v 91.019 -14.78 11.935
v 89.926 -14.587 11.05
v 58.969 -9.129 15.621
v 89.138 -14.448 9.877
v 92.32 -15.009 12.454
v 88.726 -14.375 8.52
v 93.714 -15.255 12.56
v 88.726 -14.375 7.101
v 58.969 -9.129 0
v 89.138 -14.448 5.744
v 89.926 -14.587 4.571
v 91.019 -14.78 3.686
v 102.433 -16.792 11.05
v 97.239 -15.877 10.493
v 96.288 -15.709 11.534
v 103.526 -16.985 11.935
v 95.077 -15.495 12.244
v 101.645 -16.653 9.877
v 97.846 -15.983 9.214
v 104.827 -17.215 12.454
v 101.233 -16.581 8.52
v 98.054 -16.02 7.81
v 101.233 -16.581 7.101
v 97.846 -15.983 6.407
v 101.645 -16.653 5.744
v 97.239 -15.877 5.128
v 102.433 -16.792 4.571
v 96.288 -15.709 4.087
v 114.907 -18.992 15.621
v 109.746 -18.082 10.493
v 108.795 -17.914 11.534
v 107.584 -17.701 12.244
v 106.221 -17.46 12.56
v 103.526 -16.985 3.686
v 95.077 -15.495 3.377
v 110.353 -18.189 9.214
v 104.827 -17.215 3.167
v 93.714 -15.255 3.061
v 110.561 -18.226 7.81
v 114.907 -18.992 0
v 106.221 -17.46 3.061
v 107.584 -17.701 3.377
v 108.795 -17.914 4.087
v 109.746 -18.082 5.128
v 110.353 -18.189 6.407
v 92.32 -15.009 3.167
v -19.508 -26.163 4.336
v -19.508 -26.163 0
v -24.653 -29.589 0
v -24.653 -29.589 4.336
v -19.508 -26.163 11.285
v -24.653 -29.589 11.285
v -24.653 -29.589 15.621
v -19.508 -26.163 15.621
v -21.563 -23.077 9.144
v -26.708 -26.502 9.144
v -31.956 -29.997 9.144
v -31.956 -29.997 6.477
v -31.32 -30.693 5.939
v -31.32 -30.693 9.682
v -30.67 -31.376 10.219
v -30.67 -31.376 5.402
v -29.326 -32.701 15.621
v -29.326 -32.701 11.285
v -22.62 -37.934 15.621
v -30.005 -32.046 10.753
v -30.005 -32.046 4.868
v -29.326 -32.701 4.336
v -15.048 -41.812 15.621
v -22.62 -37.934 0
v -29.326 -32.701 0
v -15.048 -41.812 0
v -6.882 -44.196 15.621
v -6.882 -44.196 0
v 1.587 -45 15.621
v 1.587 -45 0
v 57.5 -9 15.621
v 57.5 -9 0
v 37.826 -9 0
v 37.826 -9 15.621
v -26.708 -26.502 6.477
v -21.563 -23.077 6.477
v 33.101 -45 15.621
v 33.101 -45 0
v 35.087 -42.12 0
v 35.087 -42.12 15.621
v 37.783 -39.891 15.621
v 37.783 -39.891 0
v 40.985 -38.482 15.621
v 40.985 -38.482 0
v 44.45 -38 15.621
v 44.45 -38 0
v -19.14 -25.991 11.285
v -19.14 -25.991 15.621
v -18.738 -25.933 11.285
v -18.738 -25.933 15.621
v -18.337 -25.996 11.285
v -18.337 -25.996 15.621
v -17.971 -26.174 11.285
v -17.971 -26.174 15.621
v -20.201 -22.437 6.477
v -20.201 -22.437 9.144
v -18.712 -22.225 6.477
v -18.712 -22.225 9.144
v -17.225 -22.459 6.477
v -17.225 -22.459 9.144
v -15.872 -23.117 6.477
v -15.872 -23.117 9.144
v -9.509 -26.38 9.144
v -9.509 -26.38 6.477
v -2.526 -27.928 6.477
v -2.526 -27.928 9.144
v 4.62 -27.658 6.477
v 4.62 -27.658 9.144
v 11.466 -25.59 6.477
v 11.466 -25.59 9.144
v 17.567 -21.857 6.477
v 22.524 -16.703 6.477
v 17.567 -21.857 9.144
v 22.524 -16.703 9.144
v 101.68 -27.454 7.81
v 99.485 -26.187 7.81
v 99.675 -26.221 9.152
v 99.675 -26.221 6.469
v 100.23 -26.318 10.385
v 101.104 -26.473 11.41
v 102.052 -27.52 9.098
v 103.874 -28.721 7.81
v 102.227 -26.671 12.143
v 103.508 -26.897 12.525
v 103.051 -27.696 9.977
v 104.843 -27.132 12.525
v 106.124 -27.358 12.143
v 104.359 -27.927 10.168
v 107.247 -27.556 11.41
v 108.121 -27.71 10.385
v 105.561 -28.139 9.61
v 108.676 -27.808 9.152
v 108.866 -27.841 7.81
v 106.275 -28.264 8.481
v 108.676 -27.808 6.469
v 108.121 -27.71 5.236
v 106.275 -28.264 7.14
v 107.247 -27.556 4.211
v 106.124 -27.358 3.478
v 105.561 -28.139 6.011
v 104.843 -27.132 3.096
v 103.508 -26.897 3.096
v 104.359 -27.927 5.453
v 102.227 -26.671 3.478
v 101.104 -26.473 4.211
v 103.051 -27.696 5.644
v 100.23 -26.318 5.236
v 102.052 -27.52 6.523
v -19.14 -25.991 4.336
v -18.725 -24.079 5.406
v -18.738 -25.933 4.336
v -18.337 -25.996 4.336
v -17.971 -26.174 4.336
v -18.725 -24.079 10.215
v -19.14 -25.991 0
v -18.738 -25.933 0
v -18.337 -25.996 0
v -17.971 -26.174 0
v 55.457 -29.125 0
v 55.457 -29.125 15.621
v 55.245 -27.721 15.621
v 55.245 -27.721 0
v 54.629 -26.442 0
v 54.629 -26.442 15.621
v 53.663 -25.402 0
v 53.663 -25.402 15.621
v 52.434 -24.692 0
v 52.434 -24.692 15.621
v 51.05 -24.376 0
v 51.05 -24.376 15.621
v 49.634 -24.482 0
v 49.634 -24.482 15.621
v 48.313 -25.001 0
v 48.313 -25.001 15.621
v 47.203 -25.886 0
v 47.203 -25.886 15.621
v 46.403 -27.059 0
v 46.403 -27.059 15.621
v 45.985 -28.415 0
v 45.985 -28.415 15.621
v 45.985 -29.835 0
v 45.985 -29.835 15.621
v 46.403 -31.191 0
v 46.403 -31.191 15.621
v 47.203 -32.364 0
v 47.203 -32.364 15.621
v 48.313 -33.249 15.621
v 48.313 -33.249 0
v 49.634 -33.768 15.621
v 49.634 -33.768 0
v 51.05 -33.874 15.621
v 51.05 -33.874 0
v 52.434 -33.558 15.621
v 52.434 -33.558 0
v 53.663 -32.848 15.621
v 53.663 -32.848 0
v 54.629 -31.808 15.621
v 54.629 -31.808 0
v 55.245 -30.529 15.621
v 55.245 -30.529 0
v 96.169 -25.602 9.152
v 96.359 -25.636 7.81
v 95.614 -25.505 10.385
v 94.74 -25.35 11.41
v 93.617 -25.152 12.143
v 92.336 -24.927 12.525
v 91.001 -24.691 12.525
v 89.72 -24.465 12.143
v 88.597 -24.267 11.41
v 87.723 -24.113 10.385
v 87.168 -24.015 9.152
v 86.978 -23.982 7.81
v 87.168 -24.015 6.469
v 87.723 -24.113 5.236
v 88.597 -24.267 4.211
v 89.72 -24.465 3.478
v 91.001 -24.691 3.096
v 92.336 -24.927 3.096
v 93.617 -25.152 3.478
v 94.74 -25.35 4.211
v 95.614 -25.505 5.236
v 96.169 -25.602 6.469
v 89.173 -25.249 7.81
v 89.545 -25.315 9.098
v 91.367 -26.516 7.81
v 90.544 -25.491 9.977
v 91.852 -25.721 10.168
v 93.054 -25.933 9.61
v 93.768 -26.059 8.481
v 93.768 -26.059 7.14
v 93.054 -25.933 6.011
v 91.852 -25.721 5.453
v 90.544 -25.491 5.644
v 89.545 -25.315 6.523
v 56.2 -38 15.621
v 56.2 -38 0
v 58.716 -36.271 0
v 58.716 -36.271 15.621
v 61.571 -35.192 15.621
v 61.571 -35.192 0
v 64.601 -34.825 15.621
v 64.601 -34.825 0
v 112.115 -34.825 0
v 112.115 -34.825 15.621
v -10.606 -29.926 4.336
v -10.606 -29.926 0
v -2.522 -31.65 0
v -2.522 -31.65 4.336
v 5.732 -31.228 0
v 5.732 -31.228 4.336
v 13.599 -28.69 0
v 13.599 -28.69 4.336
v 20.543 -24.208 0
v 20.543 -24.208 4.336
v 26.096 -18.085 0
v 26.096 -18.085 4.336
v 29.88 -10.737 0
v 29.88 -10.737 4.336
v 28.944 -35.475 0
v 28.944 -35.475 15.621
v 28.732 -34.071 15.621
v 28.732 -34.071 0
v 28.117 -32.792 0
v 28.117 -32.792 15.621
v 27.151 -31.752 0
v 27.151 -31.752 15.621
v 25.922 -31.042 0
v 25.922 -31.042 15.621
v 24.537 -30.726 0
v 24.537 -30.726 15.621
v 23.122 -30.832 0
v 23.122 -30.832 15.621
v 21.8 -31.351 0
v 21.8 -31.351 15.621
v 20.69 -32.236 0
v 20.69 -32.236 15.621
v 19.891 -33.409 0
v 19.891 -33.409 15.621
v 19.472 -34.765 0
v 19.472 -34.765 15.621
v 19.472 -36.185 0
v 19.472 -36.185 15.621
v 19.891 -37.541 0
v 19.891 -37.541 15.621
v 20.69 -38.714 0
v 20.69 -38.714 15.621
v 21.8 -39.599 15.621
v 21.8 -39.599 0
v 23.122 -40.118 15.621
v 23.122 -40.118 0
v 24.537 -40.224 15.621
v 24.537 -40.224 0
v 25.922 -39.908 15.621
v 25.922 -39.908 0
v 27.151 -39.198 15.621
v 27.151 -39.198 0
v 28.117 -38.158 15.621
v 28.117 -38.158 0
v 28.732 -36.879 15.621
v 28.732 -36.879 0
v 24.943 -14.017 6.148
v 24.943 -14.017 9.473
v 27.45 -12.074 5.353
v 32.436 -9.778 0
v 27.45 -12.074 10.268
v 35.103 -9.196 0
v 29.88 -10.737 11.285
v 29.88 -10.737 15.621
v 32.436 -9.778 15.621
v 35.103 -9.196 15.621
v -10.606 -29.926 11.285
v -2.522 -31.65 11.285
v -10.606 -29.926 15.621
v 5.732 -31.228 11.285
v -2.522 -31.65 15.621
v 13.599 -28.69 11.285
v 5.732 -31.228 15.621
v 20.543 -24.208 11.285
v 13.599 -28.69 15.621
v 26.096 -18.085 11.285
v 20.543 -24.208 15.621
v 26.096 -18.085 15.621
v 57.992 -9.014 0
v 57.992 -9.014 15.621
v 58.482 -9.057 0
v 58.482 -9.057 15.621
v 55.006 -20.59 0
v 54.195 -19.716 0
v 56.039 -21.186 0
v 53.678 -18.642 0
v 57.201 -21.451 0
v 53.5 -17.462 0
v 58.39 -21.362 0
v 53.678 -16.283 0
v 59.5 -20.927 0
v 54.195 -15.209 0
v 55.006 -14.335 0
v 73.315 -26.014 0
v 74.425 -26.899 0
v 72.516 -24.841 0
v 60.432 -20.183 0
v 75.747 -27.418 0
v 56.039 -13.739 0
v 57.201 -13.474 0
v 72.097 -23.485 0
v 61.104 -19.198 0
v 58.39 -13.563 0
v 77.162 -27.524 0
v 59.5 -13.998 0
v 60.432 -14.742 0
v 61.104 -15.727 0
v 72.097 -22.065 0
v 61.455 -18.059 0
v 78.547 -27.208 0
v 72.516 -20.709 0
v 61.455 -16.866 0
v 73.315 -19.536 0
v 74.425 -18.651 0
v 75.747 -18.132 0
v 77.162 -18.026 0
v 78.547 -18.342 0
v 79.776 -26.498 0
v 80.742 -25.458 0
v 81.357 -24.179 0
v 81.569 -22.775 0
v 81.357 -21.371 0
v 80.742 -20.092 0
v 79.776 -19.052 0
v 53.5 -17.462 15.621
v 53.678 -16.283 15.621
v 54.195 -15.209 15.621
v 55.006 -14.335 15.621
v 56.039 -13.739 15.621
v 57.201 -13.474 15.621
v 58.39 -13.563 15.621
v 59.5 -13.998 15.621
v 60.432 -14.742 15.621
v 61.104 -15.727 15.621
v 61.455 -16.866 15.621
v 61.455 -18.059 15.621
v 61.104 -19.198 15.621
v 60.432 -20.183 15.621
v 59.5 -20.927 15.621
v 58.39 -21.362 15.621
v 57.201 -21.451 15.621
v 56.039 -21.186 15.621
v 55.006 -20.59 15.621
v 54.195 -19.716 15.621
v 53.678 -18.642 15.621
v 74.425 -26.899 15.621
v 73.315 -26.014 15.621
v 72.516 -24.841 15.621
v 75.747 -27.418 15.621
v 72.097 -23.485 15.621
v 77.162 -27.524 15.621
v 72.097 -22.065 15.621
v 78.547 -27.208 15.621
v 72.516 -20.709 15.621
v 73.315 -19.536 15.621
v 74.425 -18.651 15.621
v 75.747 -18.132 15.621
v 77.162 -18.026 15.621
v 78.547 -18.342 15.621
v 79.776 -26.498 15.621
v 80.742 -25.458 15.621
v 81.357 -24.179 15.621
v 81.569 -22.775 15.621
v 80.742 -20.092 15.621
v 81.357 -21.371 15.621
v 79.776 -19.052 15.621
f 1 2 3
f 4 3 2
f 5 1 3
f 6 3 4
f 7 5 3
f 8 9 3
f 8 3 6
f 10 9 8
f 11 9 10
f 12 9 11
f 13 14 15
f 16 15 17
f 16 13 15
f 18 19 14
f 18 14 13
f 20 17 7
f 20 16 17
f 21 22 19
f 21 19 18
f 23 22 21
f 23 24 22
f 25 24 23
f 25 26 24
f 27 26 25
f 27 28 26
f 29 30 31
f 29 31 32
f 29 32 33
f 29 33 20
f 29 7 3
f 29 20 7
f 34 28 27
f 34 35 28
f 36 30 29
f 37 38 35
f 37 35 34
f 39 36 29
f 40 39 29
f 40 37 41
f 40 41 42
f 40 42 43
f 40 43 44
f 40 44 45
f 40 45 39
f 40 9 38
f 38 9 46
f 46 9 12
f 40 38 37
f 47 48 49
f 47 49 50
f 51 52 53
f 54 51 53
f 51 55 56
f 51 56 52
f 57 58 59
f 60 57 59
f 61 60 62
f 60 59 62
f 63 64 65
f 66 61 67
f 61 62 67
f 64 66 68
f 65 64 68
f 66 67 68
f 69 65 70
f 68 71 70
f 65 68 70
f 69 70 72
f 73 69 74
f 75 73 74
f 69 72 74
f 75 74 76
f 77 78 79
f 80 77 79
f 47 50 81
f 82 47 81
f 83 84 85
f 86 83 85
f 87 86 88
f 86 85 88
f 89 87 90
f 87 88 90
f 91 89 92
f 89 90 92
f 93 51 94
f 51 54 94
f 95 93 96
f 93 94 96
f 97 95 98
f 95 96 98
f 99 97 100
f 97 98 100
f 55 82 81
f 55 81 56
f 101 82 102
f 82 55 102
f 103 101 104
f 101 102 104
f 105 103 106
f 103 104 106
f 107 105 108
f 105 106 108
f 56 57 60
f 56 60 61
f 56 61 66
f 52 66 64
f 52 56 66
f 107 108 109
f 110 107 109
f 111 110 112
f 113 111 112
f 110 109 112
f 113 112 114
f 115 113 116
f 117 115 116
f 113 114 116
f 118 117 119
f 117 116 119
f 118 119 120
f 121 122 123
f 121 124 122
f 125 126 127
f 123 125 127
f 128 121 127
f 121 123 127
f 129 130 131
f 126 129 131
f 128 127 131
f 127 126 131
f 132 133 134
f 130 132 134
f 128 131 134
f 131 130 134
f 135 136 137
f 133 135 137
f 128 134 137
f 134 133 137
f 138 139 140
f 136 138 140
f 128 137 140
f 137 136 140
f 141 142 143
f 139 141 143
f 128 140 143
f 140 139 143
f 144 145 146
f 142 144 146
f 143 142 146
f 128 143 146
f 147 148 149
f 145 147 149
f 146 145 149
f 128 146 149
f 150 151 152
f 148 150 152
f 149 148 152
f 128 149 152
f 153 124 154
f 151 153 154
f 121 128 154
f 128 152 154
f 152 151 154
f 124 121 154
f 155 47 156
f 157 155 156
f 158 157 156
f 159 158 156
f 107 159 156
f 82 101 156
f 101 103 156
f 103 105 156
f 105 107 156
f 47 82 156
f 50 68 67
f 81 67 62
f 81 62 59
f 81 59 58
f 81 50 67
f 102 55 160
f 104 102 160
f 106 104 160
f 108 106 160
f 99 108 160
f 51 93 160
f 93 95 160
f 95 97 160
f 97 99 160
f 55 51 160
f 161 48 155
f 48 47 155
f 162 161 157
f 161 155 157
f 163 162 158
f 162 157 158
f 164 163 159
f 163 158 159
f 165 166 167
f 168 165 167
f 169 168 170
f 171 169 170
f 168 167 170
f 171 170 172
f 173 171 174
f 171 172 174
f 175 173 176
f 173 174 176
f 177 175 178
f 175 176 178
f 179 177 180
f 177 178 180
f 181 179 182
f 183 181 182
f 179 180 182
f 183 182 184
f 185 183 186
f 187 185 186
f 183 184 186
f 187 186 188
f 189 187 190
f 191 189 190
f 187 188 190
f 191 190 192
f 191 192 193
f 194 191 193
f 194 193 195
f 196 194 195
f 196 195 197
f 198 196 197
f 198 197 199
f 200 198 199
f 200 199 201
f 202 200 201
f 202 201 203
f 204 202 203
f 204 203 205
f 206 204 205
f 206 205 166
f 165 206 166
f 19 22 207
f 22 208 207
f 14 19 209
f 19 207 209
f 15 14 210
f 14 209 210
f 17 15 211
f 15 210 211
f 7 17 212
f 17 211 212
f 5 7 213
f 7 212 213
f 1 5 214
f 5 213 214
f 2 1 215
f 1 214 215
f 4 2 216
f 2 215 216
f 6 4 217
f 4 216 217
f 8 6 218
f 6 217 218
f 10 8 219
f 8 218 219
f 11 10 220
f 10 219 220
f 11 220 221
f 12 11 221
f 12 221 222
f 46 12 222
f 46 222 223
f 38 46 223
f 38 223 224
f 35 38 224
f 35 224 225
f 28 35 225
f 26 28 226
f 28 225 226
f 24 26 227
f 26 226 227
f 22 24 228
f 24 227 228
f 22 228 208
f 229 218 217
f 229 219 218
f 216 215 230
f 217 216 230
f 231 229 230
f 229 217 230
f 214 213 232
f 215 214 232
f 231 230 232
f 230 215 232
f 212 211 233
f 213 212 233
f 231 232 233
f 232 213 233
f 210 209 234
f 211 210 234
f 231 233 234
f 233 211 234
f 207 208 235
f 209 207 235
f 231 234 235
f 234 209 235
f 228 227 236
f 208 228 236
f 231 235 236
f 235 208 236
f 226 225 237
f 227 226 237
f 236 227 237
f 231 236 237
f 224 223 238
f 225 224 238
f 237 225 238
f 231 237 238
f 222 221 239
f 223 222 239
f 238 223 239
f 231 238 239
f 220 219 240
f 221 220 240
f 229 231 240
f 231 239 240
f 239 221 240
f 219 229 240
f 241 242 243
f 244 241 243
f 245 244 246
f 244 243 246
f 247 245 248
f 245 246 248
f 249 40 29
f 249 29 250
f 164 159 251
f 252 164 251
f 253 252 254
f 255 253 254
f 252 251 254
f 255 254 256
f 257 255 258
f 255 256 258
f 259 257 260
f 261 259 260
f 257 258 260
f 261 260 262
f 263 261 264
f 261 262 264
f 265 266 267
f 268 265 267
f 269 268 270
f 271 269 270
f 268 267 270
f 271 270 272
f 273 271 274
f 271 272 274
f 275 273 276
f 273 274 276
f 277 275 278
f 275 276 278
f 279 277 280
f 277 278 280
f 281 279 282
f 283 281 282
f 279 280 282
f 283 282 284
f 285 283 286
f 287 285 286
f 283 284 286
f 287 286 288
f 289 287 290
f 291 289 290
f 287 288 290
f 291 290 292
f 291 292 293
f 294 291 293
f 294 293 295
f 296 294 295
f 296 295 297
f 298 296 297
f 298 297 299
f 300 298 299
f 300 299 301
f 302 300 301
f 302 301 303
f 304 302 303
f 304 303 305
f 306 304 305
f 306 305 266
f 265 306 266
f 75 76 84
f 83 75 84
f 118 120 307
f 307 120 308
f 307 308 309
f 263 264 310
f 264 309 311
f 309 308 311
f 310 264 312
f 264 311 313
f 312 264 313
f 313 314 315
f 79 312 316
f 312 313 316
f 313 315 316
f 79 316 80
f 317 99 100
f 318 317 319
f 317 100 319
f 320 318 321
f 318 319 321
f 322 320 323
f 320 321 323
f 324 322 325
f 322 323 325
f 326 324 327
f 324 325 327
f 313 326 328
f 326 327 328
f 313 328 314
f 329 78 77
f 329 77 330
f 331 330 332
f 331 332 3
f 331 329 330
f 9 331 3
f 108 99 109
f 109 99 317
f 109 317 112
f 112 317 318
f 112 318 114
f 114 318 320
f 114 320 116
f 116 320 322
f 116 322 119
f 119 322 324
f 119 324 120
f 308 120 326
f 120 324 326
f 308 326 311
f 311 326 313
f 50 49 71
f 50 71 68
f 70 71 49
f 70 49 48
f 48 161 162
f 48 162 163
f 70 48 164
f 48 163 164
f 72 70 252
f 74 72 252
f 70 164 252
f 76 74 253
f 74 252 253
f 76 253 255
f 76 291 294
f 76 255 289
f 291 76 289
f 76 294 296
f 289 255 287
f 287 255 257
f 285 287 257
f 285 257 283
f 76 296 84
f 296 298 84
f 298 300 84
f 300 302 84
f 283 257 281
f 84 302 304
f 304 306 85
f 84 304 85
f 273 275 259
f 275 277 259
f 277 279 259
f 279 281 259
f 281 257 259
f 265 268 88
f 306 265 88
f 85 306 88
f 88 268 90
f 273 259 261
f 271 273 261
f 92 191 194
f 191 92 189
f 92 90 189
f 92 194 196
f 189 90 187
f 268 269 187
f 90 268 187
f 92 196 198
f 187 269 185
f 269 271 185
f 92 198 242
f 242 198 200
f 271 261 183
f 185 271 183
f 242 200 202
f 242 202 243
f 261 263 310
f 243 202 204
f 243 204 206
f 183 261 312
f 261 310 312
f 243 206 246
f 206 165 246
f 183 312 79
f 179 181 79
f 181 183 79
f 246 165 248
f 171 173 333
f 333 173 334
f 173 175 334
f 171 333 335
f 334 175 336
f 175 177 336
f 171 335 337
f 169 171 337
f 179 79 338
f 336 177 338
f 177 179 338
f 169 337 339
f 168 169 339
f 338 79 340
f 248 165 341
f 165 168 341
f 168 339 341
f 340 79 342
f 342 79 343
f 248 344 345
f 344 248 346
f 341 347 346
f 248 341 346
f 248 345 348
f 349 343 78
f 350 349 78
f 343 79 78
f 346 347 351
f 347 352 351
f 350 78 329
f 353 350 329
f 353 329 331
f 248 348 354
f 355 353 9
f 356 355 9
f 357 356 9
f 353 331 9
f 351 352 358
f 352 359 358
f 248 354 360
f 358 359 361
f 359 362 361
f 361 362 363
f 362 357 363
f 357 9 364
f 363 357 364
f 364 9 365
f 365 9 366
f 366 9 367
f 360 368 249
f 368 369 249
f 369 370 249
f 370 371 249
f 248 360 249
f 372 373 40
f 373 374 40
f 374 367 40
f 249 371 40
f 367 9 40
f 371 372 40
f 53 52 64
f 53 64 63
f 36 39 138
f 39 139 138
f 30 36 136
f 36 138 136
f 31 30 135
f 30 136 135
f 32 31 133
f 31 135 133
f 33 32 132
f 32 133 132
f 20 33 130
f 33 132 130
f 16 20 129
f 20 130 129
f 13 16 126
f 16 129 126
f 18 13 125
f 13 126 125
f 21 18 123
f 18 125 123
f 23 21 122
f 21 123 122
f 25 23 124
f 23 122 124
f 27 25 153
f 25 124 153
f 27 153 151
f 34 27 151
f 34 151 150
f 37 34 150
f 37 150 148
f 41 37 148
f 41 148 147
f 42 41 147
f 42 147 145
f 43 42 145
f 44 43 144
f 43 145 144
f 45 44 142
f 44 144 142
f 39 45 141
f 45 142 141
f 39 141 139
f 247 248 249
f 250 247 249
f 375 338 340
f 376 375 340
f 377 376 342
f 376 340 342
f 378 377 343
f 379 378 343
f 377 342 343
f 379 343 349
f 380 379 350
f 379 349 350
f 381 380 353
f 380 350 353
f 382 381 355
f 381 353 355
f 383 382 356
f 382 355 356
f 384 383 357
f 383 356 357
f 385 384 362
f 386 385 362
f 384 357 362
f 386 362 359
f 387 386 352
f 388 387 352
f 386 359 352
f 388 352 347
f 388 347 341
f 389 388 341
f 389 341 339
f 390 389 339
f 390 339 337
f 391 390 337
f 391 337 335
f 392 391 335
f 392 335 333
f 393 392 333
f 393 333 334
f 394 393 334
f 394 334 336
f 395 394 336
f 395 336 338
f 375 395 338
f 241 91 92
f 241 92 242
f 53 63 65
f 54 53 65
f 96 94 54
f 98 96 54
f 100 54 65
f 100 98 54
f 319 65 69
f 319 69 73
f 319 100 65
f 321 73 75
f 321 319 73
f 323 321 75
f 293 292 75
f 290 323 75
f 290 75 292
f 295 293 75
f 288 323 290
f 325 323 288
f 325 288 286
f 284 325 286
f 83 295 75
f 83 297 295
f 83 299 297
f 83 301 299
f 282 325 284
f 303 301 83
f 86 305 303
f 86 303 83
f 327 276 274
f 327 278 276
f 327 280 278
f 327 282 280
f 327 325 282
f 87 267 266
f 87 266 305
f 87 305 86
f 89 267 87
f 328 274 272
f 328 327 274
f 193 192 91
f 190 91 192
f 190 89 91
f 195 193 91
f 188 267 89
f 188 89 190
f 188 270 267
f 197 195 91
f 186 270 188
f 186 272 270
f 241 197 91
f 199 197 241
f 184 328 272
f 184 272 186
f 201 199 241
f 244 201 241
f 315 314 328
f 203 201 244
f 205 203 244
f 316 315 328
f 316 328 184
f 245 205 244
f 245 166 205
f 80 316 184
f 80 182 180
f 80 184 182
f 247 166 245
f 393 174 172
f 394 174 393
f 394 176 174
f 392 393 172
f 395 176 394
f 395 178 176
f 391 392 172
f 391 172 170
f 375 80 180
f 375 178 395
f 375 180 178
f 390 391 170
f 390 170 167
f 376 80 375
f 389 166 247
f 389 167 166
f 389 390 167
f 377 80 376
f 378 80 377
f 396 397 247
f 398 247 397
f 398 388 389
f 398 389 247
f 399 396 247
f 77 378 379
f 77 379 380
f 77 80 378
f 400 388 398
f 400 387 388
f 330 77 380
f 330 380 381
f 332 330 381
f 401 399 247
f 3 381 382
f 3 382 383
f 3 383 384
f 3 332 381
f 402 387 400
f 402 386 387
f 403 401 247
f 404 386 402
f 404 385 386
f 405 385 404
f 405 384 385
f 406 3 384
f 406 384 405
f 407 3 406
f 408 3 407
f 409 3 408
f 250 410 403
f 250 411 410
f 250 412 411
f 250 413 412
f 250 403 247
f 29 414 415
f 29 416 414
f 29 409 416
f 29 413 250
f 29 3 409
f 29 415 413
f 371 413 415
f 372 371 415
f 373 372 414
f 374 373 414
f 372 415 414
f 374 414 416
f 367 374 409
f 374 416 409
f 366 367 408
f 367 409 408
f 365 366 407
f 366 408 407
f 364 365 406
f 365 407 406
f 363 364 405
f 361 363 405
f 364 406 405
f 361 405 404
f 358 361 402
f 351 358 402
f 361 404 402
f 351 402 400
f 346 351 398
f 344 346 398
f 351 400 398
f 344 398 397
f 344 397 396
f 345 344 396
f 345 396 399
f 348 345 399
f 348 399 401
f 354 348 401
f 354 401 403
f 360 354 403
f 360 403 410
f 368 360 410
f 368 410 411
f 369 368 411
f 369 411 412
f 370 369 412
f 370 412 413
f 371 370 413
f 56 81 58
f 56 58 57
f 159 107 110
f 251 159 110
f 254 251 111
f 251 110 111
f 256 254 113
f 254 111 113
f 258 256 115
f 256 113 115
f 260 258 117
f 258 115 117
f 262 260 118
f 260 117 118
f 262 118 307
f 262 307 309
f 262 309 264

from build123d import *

# Parameters (mm, degrees)
EXTRUDE1_DEPTH                   = 15.621
SKETCH5_W                        = 270.806573858
SKETCH5_H                        = 166.102939791
EXTRUDE2_DEPTH                   = 160.670835286
SKETCH6_R                        = 4
EXTRUDE3_DEPTH                   = 160.670835296
EXTRUDE4_DEPTH                   = 160.670835296
F_3_8_0_375_DIAMETER_HOLE1_D     = 9.525
F_3_8_0_375_DIAMETER_HOLE1_DEPTH = 25.4
F_3_8_0_375_DIAMETER_HOLE1_TIP   = 1.733408241
F_3_8_0_375_DIAMETER_HOLE2_D     = 9.525
F_3_8_0_375_DIAMETER_HOLE2_DEPTH = 9.7639886
F_3_8_0_375_DIAMETER_HOLE2_TIP   = 1.733408241
EXTRUDE7_DEPTH                   = 125.388654342
EXTRUDE7_DEPTH_BACK              = 125.388654342


with BuildPart() as part:
    # Sketch1 → Extrude1 (new body)
    with BuildSketch(Plane.XY):
        with BuildLine():
            Line((-18.523440753, -21.052635779), (-31.956486184, -29.996682998))
            ThreePointArc((-31.956486184, -29.996682998), (-16.785704199, -41.078283404), (1.5875, -45))
            Line((1.5875, -45), (33.100991233, -45))
            ThreePointArc((33.100991233, -45), (37.78291668, -39.890744707), (44.45, -38))
            Line((44.45, -38), (152.4, -38))
            Line((152.4, -38), (152.4, -21.7))
            Line((152.4, -21.7), (139.7, -21.7))
            Line((139.7, -21.7), (139.7, -9))
            Line((139.7, -9), (26.558074677, -9))
            ThreePointArc((26.558074677, -9), (7.242606084, -27.090145582), (-18.523440753, -21.052635779))
        make_face()
    extrude(amount=EXTRUDE1_DEPTH)

    # Cut-Sweep1: sweep along a path in Sketch4
    with BuildLine(Plane.XY.offset(15.621)) as cut_sweep1_path:
        Line((-31.956486184, -29.996682998), (-26.708036397, -26.502137926))
        Line((-26.708036397, -26.502137926), (-21.563139896, -23.076541141))
        ThreePointArc((-21.563139896, -23.076541141), (-18.711510192, -22.22512912), (-15.872310869, -23.117116564))
        ThreePointArc((-15.872310869, -23.117116564), (8.852662428, -26.607549652), (26.558074677, -9))
    # Sketch3 → Cut-Sweep1 (sweep, cut)
    with BuildSketch(Plane(origin=(26.558074677, -9, 15.621), x_dir=(0.9470955536490446, -0.3209517288599796, 0), z_dir=(-0.3209517288599796, -0.9470955536490446, 0))):
        Polygon((-25.4, 0), (3.7084, 0), (3.7084, -4.335954262), (0, -6.477), (0, -9.144), (3.7084, -11.285045738), (3.7084, -15.621), (-25.4, -15.621), (-25.4, -7.8105), align=None)
    sweep(path=cut_sweep1_path.line, mode=Mode.SUBTRACT)

    # Sketch5 → Extrude2 (cut, through all)
    with BuildSketch(Plane.XY.offset(15.621)):
        with Locations((52.123498329, -22.277908904)):
            Rectangle(SKETCH5_W, SKETCH5_H)
        with BuildLine():
            Line((38.333012193, 16.803768596), (31.532220939, 12.275636952))
            ThreePointArc((31.532220939, 12.275636952), (27.554347044, 11.558888171), (24.312391752, 13.972792773))
            ThreePointArc((24.312391752, 13.972792773), (-27.994081927, 1.631780505), (22.524298891, -16.702912621))
            ThreePointArc((22.524298891, -16.702912621), (29.260489218, -11.034352575), (37.826132376, -9))
            Line((37.826132376, -9), (139.7, -9))
            Line((139.7, -9), (139.7, -21.7))
            Line((139.7, -21.7), (152.4, -21.7))
            Line((152.4, -21.7), (152.4, -45))
            Line((152.4, -45), (1.5875, -45))
            ThreePointArc((1.5875, -45), (-37.731008972, 21.887321724), (39.835360247, 23.708673234))
            ThreePointArc((39.835360247, 23.708673234), (40.481466367, 19.95220497), (38.333012193, 16.803768596))
        make_face(mode=Mode.SUBTRACT)
    extrude(amount=-EXTRUDE2_DEPTH, mode=Mode.SUBTRACT)

    # Sketch6 → Extrude3 (cut, through all)
    with BuildSketch(Plane(origin=(0, 0, 0), x_dir=(-1, 0, 0), z_dir=(0, 0, -1))):
        with Locations((-57.5, -17.4625)):
            Circle(SKETCH6_R)
    extrude(amount=-EXTRUDE3_DEPTH, mode=Mode.SUBTRACT)

    # Sketch7 → Extrude4 (cut, through all)
    with BuildSketch(Plane(origin=(0, 0, 0), x_dir=(-1, 0, 0), z_dir=(0, 0, -1))):
        with BuildLine():
            Line((-58.969497704, -9.12856439), (-114.906578075, -18.991780882))
            Line((-114.906578075, -18.991780882), (-110.320627324, -45))
            Line((-110.320627324, -45), (-152.4, -45))
            Line((-152.4, -45), (-152.4, -9))
            Line((-152.4, -9), (-57.5, -9))
            ThreePointArc((-57.5, -9), (-58.237555473, -9.032202367), (-58.969497704, -9.12856439))
        make_face()
    extrude(amount=-EXTRUDE4_DEPTH, mode=Mode.SUBTRACT)

    # 3/8 (0.375) Diameter Hole1
    with Locations(Plane(origin=(0, 0, 0), x_dir=(-1, 0, 0), z_dir=(0, 0, -1))):
        with Locations((-24.181578009, -35.475), (-50.694078075, -29.125), (-76.806578075, -22.775)):
            Hole(F_3_8_0_375_DIAMETER_HOLE1_D / 2, depth=F_3_8_0_375_DIAMETER_HOLE1_DEPTH)
            with Locations((0, 0, -(F_3_8_0_375_DIAMETER_HOLE1_DEPTH + F_3_8_0_375_DIAMETER_HOLE1_TIP / 2))):  # 140° drill point
                Cone(0, F_3_8_0_375_DIAMETER_HOLE1_D / 2, F_3_8_0_375_DIAMETER_HOLE1_TIP, mode=Mode.SUBTRACT)

    # 3/8 (0.375) Diameter Hole2
    with Locations(Plane(origin=(0.217071479, 1.231073535, 0), x_dir=(-0.9848077530122092, 0.17364817766692367, 0), z_dir=(0.17364817766692367, 0.9848077530122092, 0))):
        with Locations((-94.583777101, 7.8105), (-107.283777101, 7.8105)):
            Hole(F_3_8_0_375_DIAMETER_HOLE2_D / 2, depth=F_3_8_0_375_DIAMETER_HOLE2_DEPTH)
            with Locations((0, 0, -(F_3_8_0_375_DIAMETER_HOLE2_DEPTH + F_3_8_0_375_DIAMETER_HOLE2_TIP / 2))):  # 140° drill point
                Cone(0, F_3_8_0_375_DIAMETER_HOLE2_D / 2, F_3_8_0_375_DIAMETER_HOLE2_TIP, mode=Mode.SUBTRACT)

    # Sketch13 → Extrude7 (cut, two sides: drawn at the far end of the back side and taken through both)
    with BuildSketch(Plane.XY.offset(15.621).offset(-EXTRUDE7_DEPTH_BACK)):
        with BuildLine():
            Line((-170.850798283, -238.240416596), (56.200492318, -38))
            ThreePointArc((56.200492318, -38), (60.110624671, -35.645237797), (64.600752731, -34.825))
            Line((64.600752731, -34.825), (112.114754353, -34.825))
            Line((112.114754353, -34.825), (414.849808488, -34.825))
            Line((414.849808488, -34.825), (613.492170854, -606.782396913))
            Line((613.492170854, -606.782396913), (27.791564083, -810.197813509))
            Line((27.791564083, -810.197813509), (-170.850798283, -238.240416596))
        make_face()
    extrude(amount=EXTRUDE7_DEPTH + EXTRUDE7_DEPTH_BACK, mode=Mode.SUBTRACT)


solid = part.part
